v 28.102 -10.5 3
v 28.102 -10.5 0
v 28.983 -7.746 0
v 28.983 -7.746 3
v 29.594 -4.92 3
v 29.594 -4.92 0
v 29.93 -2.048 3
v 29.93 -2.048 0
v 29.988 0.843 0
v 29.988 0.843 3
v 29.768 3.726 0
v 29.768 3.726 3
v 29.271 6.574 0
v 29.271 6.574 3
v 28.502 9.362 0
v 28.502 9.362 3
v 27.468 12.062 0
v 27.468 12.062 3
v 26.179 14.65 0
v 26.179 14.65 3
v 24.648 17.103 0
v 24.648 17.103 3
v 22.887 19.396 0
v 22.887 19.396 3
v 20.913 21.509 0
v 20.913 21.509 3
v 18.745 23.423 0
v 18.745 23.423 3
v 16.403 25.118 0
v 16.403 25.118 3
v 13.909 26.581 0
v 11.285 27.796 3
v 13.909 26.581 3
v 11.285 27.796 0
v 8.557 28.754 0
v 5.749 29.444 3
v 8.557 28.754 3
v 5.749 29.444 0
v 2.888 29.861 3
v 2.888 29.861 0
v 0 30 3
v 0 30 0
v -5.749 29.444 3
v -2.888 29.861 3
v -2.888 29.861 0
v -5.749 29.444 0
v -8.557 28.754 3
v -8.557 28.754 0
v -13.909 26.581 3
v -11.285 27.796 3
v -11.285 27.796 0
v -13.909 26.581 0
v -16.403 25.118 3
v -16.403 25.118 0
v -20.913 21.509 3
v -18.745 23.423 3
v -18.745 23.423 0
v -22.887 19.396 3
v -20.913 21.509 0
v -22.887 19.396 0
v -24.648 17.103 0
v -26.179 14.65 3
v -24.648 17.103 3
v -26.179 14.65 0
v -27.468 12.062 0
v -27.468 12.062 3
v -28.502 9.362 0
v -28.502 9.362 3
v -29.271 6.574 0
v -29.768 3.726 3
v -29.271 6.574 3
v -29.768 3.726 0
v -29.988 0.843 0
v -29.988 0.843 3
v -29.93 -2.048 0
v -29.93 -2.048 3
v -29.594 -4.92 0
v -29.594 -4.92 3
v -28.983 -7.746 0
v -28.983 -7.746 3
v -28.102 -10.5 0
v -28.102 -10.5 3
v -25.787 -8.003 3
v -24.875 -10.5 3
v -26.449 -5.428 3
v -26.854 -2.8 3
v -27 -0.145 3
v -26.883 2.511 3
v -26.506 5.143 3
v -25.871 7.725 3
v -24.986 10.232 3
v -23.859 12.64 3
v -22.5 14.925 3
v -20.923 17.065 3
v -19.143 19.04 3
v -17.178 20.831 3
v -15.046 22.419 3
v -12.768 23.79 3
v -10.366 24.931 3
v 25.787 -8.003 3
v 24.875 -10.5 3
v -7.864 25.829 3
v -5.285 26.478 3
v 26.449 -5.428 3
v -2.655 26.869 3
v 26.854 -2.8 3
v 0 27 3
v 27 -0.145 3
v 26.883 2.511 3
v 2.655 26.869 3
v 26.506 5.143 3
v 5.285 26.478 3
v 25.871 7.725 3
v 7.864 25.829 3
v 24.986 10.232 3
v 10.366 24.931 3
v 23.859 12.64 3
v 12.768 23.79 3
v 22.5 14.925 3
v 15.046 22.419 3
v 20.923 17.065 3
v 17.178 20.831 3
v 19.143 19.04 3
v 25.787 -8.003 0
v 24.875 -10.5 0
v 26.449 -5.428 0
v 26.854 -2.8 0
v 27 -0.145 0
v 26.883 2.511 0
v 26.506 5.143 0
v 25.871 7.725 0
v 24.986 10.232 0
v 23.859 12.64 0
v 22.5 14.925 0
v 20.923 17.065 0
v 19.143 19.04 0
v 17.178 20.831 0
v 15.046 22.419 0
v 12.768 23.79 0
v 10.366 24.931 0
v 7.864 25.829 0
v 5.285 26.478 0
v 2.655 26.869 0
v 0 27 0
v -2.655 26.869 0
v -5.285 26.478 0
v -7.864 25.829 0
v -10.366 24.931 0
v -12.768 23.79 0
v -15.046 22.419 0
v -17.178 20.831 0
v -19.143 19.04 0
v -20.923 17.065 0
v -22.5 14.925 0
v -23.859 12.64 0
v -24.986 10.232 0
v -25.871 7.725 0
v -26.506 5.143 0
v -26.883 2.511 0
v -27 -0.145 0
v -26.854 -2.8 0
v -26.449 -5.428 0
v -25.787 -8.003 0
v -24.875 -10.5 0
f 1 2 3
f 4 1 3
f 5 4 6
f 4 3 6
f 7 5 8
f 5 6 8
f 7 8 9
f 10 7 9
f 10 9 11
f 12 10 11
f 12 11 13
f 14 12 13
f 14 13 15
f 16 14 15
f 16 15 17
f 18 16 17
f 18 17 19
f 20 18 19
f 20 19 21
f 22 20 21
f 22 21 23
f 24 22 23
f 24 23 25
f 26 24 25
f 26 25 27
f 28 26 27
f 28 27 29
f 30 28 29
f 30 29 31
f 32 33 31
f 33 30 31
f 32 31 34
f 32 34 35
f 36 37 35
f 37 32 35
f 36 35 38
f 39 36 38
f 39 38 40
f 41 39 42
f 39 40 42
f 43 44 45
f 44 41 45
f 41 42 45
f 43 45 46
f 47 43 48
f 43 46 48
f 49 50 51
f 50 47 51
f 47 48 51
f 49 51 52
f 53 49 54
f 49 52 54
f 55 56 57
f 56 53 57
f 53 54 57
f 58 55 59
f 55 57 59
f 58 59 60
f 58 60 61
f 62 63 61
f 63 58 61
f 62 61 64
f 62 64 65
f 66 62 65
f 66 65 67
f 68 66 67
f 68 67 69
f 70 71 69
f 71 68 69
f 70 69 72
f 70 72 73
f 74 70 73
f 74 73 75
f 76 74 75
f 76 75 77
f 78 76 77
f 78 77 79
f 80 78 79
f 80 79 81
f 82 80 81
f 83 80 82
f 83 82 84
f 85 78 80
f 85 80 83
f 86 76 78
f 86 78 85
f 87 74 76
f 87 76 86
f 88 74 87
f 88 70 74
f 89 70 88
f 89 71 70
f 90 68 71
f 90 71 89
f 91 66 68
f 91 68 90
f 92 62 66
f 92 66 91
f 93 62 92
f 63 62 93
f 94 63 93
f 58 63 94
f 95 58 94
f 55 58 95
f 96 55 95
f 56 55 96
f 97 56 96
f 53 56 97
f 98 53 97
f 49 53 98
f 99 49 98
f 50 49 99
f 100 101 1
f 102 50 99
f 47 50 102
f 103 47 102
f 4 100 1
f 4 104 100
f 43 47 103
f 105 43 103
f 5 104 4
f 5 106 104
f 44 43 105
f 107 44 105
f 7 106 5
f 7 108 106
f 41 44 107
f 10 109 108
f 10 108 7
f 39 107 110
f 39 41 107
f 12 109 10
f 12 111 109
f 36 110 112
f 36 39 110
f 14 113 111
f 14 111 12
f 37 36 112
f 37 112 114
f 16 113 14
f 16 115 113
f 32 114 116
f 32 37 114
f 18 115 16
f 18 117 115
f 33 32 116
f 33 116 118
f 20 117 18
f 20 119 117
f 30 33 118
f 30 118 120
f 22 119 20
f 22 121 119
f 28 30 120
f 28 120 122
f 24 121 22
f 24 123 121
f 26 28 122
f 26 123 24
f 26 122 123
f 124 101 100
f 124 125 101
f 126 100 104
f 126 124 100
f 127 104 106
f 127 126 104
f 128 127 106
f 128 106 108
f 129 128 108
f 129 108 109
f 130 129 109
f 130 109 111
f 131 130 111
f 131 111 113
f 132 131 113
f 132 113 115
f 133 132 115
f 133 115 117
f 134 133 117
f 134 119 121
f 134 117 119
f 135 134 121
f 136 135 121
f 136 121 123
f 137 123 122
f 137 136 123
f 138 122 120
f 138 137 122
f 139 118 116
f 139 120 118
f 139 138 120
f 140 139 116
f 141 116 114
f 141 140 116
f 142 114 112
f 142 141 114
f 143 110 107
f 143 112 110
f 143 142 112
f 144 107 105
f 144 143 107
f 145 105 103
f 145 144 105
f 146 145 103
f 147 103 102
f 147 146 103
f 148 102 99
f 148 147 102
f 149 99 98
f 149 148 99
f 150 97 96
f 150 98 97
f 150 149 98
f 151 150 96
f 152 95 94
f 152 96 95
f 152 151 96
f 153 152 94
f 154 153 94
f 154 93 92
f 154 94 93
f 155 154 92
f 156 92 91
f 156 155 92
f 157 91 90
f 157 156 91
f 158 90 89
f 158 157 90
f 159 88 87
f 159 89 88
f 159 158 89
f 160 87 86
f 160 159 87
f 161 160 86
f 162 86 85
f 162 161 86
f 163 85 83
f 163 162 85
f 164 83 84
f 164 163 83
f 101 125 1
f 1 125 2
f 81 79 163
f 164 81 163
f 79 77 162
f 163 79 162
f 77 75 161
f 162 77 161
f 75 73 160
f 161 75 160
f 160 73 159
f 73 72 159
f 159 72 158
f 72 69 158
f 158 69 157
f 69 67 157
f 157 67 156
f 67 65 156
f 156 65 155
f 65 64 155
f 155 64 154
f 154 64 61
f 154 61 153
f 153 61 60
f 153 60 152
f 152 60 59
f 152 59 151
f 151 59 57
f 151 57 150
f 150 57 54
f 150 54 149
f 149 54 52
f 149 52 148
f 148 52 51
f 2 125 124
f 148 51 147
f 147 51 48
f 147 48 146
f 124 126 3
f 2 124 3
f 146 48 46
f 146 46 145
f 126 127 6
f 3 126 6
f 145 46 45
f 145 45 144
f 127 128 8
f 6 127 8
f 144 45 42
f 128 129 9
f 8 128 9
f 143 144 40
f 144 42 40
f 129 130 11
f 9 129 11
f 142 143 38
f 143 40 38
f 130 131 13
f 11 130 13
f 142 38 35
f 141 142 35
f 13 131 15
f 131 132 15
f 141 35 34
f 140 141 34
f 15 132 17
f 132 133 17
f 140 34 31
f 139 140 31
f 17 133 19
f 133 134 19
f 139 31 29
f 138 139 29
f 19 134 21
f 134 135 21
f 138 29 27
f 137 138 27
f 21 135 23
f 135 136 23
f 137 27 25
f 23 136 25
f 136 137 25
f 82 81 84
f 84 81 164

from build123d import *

# Parameters (mm, degrees)
SKETCH1_R                             = 30
ARCH_OUTER_DEPTH                      = 3
WHEEL_CLEARANCE_R27_START             = -0.1
SKETCH2_R                             = 27
WHEEL_CLEARANCE_R27_DEPTH             = 3.2
OPEN_BOTTOM_AT_GROUND_CLEARANCE_START = -0.1
SKETCH3_W                             = 62
SKETCH3_H                             = 20.5
OPEN_BOTTOM_AT_GROUND_CLEARANCE_DEPTH = 3.2


with BuildPart() as part:
    # Sketch1 → Arch_Outer (new body)
    with BuildSketch(Plane.XY):
        Circle(SKETCH1_R)
    extrude(amount=ARCH_OUTER_DEPTH)

    # Sketch2 → Wheel_Clearance_R27 (cut)
    with BuildSketch(Plane.XY.offset(WHEEL_CLEARANCE_R27_START)):
        Circle(SKETCH2_R)
    extrude(amount=WHEEL_CLEARANCE_R27_DEPTH, mode=Mode.SUBTRACT)

    # Sketch3 → Open_Bottom_At_Ground_Clearance (cut)
    with BuildSketch(Plane.XY.offset(OPEN_BOTTOM_AT_GROUND_CLEARANCE_START)):
        with Locations((0, -20.75)):
            Rectangle(SKETCH3_W, SKETCH3_H)
    extrude(amount=OPEN_BOTTOM_AT_GROUND_CLEARANCE_DEPTH, mode=Mode.SUBTRACT)


solid = part.part
